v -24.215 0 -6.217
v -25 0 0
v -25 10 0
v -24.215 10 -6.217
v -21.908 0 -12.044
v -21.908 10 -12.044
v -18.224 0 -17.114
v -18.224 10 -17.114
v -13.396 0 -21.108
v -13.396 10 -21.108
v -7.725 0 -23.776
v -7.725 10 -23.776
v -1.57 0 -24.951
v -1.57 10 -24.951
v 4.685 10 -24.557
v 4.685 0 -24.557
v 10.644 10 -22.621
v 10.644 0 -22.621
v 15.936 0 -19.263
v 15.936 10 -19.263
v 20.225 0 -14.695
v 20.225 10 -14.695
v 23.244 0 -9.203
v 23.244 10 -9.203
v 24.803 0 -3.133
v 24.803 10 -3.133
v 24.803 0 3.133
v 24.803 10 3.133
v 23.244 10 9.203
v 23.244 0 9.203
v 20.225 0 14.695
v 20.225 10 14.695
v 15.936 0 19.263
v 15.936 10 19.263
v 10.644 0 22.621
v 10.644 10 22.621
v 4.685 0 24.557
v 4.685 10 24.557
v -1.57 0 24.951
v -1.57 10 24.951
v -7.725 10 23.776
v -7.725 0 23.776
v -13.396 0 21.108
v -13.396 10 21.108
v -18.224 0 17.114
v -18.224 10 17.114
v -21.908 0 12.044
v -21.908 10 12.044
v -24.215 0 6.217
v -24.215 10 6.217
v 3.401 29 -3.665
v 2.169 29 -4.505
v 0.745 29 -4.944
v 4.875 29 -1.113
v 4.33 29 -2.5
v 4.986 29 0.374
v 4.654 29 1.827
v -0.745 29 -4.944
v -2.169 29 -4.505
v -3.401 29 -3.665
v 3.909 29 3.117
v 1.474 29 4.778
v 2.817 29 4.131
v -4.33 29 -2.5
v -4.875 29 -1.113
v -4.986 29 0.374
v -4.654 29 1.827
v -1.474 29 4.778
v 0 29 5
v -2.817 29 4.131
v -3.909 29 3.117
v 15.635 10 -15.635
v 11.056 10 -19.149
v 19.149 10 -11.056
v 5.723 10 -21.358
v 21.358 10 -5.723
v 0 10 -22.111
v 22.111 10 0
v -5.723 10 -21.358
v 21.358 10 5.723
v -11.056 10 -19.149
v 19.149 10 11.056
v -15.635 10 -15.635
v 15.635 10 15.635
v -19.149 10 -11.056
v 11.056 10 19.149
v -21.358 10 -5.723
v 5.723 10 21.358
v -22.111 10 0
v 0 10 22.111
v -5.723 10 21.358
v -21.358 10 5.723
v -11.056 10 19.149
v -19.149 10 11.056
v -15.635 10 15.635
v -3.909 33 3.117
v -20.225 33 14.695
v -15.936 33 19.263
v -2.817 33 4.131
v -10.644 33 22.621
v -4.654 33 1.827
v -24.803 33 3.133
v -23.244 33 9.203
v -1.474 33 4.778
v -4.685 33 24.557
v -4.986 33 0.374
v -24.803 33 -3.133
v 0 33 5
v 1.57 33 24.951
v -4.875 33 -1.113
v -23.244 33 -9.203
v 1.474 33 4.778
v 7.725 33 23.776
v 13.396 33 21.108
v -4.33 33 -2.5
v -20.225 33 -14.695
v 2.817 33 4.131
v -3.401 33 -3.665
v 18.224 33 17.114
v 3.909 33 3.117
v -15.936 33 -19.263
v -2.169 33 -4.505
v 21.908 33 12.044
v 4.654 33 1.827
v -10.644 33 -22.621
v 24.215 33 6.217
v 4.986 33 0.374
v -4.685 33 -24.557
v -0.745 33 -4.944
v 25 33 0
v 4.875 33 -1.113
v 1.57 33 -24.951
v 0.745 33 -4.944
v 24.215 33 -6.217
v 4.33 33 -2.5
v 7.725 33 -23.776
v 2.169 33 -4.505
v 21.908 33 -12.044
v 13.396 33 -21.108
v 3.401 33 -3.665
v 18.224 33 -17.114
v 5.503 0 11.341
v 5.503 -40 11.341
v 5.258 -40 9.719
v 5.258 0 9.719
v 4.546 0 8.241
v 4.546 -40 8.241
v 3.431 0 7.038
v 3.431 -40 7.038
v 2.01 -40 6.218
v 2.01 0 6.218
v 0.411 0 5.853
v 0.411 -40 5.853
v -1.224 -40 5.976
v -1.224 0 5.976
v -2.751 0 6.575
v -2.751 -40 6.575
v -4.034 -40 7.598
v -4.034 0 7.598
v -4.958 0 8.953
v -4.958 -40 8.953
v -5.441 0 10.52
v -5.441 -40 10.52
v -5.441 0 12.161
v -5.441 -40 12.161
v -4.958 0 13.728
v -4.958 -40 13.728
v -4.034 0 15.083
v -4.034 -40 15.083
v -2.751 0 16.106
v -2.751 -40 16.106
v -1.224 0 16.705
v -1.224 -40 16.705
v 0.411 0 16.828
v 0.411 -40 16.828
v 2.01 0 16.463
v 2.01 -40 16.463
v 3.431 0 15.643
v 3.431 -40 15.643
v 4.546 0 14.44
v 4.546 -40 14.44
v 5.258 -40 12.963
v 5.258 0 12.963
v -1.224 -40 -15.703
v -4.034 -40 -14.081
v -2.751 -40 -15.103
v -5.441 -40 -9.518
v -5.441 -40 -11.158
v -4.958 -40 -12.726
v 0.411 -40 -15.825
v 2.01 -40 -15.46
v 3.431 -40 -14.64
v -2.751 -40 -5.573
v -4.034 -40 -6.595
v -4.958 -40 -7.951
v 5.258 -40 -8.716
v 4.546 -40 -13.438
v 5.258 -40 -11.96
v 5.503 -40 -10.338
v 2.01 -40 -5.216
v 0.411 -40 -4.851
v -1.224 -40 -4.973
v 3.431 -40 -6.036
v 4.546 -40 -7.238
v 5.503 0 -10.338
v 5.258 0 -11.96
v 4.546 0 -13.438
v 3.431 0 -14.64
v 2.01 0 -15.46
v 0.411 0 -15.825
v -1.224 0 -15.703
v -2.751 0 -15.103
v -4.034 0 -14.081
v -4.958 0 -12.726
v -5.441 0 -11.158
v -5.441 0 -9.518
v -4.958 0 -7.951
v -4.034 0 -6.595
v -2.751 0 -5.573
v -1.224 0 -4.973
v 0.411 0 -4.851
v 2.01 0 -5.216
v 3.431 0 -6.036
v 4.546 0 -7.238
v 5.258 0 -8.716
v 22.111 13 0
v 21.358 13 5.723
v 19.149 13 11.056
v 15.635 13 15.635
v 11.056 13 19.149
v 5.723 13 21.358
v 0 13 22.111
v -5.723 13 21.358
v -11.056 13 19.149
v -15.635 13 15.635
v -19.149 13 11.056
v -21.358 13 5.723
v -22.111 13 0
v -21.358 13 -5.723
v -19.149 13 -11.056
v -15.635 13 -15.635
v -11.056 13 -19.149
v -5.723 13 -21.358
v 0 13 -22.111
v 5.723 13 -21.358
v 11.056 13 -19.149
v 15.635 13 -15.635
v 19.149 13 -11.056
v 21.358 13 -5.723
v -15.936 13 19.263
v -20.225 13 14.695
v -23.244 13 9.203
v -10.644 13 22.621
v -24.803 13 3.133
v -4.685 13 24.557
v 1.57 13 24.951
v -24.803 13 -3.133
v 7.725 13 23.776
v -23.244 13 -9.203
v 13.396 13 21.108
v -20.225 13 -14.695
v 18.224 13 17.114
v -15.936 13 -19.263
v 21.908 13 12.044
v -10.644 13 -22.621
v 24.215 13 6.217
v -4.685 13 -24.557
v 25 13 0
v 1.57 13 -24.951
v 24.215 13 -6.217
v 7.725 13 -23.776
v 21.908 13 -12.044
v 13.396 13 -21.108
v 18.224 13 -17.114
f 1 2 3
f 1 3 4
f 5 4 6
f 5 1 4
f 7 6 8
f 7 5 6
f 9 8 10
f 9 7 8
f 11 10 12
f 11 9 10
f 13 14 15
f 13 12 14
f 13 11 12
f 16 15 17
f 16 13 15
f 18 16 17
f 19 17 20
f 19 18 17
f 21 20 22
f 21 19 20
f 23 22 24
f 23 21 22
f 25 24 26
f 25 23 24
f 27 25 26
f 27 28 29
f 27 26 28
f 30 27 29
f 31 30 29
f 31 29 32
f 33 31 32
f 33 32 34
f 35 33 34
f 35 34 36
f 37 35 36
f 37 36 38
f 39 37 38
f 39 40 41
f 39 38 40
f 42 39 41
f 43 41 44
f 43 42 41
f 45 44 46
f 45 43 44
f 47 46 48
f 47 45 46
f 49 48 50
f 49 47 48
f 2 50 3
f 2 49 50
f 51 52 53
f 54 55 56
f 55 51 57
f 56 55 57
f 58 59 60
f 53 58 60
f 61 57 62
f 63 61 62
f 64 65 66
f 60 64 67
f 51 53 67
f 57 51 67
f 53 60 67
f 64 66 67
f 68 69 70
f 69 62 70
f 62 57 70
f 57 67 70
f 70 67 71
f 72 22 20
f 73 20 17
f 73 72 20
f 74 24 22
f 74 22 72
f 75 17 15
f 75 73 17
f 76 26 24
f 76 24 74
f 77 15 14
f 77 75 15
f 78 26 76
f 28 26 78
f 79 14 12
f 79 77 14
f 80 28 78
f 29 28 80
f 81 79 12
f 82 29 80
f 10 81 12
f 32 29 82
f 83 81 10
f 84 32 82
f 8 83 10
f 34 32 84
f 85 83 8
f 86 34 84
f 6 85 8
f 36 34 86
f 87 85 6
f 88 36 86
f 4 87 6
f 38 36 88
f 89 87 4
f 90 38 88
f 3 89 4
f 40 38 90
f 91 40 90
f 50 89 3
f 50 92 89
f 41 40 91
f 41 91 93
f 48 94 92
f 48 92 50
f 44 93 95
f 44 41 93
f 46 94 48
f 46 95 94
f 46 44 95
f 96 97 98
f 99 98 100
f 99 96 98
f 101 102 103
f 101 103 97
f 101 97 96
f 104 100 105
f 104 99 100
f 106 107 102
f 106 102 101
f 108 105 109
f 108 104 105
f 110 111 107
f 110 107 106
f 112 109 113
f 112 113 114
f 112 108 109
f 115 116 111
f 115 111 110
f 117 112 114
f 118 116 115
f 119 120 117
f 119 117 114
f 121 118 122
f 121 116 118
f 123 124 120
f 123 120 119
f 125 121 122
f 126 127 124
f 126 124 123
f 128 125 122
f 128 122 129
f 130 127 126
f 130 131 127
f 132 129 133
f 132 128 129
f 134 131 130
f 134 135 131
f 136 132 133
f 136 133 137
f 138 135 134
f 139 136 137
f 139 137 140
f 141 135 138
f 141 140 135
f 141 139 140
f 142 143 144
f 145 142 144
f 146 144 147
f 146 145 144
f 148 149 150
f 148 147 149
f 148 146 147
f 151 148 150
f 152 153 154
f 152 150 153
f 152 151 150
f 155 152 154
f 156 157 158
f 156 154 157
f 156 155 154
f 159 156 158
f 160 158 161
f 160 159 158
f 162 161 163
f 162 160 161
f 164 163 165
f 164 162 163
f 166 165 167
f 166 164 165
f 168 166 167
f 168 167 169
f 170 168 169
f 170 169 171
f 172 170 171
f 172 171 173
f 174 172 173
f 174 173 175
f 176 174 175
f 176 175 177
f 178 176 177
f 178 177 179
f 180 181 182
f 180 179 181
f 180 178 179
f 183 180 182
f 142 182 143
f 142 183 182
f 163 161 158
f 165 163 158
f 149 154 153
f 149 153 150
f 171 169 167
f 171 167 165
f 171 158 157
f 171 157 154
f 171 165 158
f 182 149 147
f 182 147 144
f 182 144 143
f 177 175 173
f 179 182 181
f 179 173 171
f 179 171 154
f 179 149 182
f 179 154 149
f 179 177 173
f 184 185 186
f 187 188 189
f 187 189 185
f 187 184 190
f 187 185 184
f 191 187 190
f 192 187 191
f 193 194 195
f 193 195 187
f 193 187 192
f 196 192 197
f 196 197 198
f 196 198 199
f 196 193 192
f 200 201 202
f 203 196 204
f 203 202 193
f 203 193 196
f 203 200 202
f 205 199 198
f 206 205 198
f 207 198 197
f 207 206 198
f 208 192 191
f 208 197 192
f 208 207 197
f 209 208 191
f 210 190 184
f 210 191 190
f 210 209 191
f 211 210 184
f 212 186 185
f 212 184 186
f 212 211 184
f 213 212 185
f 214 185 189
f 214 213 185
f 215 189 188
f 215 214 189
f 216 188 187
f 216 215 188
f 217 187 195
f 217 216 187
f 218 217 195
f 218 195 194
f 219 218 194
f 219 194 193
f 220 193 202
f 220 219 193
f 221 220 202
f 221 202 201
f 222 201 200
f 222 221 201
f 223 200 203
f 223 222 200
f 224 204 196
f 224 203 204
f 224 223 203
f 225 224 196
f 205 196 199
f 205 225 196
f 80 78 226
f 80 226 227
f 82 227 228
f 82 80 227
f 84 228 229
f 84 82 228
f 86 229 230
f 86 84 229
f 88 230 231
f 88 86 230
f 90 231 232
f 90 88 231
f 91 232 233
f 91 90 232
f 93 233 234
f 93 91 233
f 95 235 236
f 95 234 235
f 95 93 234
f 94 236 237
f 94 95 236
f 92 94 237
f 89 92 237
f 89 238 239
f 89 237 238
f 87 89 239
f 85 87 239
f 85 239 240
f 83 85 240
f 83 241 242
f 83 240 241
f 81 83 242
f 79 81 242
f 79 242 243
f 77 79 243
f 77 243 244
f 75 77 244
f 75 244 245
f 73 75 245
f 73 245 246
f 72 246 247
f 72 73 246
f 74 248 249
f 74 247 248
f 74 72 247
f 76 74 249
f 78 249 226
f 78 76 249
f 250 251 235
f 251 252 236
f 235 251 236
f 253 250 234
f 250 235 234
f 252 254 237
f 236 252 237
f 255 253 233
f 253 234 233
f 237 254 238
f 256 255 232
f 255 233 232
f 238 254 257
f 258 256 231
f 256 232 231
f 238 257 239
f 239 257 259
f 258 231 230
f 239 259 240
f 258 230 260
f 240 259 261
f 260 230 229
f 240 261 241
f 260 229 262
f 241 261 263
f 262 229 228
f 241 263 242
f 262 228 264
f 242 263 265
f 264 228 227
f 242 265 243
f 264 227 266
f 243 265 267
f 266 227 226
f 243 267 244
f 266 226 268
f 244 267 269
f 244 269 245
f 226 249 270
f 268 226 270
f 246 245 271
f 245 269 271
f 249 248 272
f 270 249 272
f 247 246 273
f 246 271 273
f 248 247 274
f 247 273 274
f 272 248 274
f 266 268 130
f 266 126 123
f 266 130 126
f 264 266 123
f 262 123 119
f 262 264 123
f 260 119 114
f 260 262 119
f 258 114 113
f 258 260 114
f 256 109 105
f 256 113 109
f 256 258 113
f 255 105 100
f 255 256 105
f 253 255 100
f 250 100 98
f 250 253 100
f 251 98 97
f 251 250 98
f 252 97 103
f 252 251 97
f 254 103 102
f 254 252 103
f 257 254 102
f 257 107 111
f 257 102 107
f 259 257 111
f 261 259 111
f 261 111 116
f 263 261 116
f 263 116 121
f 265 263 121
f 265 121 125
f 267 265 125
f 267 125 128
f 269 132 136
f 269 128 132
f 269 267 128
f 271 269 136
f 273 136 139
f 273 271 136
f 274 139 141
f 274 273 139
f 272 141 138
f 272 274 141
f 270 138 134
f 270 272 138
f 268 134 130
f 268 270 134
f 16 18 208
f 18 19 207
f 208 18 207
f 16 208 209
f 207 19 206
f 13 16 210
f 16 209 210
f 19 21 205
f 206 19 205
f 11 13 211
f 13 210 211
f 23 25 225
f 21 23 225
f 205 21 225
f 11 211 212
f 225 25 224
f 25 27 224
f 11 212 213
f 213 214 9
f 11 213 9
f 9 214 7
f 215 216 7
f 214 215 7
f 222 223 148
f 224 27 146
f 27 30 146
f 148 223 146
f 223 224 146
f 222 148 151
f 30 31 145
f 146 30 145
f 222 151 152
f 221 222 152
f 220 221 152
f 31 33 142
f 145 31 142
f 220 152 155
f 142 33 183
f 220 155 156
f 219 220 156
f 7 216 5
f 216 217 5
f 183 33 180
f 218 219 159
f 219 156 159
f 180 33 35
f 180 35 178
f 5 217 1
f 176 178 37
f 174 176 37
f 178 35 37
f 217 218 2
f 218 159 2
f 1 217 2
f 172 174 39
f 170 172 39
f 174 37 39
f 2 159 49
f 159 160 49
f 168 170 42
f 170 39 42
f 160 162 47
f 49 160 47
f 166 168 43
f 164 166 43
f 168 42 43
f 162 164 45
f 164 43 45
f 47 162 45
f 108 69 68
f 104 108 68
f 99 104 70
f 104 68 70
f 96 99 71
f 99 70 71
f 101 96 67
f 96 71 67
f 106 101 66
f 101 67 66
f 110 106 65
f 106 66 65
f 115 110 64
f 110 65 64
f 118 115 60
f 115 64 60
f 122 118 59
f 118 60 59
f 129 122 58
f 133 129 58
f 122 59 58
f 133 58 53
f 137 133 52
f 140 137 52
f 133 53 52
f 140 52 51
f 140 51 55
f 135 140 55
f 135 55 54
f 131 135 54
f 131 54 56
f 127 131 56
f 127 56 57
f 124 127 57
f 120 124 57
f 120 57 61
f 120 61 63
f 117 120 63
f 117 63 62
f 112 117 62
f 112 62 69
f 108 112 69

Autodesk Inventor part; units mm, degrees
ref_plane "YZ Plane" through (0, 0, 0) normal (1, 0, 0) x (0, 1, 0)
ref_plane "XZ Plane" through (0, 0, 0) normal (0, 1, 0) x (-1, 0, 0)
ref_plane "XY Plane" through (0, 0, 0) normal (0, 0, 1) x (1, 0, 0)
sketch "Sketch1" plane through (0, 0, 0) normal (0, 1, 0) x (-1, 0, 0)
  circle A0 centre (0, 0) radius 25
  dimension "d0" = 50
extrude "Extrusion1" add sketch "Sketch1" along normal blind 10
sketch "Sketch2" plane through (0, 10, 0) normal (0, 1, 0) x (1, 0, 0)
  circle A0 centre (0, 0) radius 22.1112
extrude "Extrusion2" add sketch "Sketch2" along normal blind 3
sketch "Sketch3" plane through (0, 13, 0) normal (0, 1, 0) x (1, 0, 0)
  circle A0 centre (0, 0) radius 25
extrude "Extrusion3" add sketch "Sketch3" along normal blind 20
sketch "Sketch4" plane through (0, 0, 0) normal (0, -1, 0) x (1, 0, 0)
  circle A0 centre (0, 11.3406) radius 5.5026
  circle A1 centre (0, -10.3381) radius 5.5026
  point P0 (0, 0)
extrude "Extrusion4" add sketch "Sketch4" along normal blind 40
sketch "Sketch5" plane through (0, 33, 0) normal (0, 1, 0) x (1, 0, 0)
  circle A0 centre (0, 0) radius 25 projected
hole "Hole1" at (0, 33, 0) direction (0, -1, 0) diameter 10 depth 4
properties part number "buzzer now"
